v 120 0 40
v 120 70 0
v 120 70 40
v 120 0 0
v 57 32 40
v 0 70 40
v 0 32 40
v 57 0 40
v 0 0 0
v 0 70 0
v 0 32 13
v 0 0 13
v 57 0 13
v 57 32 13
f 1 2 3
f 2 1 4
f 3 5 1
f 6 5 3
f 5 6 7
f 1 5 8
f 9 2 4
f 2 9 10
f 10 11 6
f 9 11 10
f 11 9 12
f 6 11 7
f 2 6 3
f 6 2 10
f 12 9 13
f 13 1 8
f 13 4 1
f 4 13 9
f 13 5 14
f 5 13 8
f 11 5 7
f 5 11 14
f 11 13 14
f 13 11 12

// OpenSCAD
// Dimensions in millimetres
outer_x = 120;
outer_y = 70;
outer_z = 40;

wall_thickness = 3;
floor_thickness = 3;

platform_length = 60;
platform_width = outer_y;  // spans full Y
platform_height_above_floor = 10;  // top at z = 13 (floor at z = 3, so 10 mm above)

hole_diameter = 2;
hole_radius = hole_diameter / 2;
hole_z = 30;  // z-level of hole center
hole_y = 0;   // along Y=0 (end wall)

// The tank must rest on the XY plane at z = 0, so the floor must be at z = 0
// The entire model must be shifted so that the lowest point is at z = 0
// Currently, the model is extending from z = -2.00 to z = 40.00, so we need to shift up by 2.00 mm

// We'll build everything with z = 0 at the floor, and ensure:
// - The floor is at z = 0
// - The platform top is at z = 13
// - The hole centers are at z = 30

// Build the tank body: outer dimensions 120 x 70 x 40, with 3 mm walls and 3 mm floor
// The inner cavity is from z = 3 to z = 40 (since floor is 3 mm thick), and x,y offset by wall_thickness

module tank() {
    difference() {
        // Outer box: from z = 0 to z = 40
        cube([outer_x, outer_y, outer_z], center = false);
        // Inner cavity: from z = 3 to z = 40, and x,y offset by wall_thickness
        translate([wall_thickness, wall_thickness, 3]) {
            cube([outer_x - 2*wall_thickness, outer_y - 2*wall_thickness, outer_z - 3], center = false);
        }
    }
}

// Platform: solid, 60 mm long in X, full Y, 10 mm high, top at z = 13, so bottom at z = 3
module platform() {
    // Platform is 10 mm high, from z = 3 to z = 13
    // Centered in X: from x = (120 - 60)/2 = 30 to 90
    // So center at x = 60
    translate([60, 0, 3]) {
        cube([platform_length, platform_width, 10], center = false);
    }
}

// End holes: horizontal, along X-axis, at y = 0, z = 30
// Each hole is a cylinder of diameter 2 mm, aligned along X-axis
// The hole must pass through the end wall at X = ±(outer_x/2 - wall_thickness) = ±(60 - 3) = ±57
// We'll place the cylinder at x = 57 and x = -57, but since the model is from x = 0 to 120, we use x = 57 and x = 63? Wait.

// The tank is from x = 0 to 120, y = 0 to 70, z = 0 to 40
// The left end wall is at x = 0, right end wall at x = 120
// The wall thickness is 3 mm, so the hole is drilled through the wall at x = 0 (left) and x = 120 (right)
// But the hole is horizontal, so it goes from x = 0 to x = 3 (left wall) and from x = 117 to x = 120 (right wall)

// We need to drill a hole through the left end wall (x = 0) and the right end wall (x = 120)
// The hole is centered at (x, y, z) = (0, 0, 30) for left, (120, 0, 30) for right
// But the hole is horizontal, so we use a cylinder along X-axis

module hole_at_end(x_pos) {
    // Place a cylinder at the end wall (x = x_pos), at y = 0, z = 30
    // Rotate to align cylinder along X-axis (so it's horizontal)
    translate([x_pos, 0, 30]) {
        rotate([90, 0, 0]) {
            cylinder(r = hole_radius, h = wall_thickness + 1, $fn = 64, center = true);
        }
    }
}

// Main assembly: build the tank, add the platform, then subtract the two end holes
// We do this in a single difference to ensure the holes are properly cut

$fn = 64;

// We need to ensure the entire model is at z >= 0 and centered in X and Y
// The tank is from x = 0 to 120, y = 0 to 70, so it's not centered at origin
// But the specification says "centre it on the origin in X and Y"
// So we need to shift the entire model so that the center of X is 0, and center of Y is 0

// Current tank: x = 0 to 120 → center at x = 60
// y = 0 to 70 → center at y = 35
// So we need to translate by (-60, -35, 0)

// But the floor is at z = 0, so we don't shift in z

// Let's build the model centered at origin

// We'll build the entire model with x from -60 to 60, y from -35 to 35, z from 0 to 40
// So we need to shift the tank and platform accordingly

// Recompute: we'll build everything relative to center

// New centering:
// - X: from -60 to 60 (size 120)
// - Y: from -35 to 35 (size 70)
// - Z: from 0 to 40 (size 40)

// Tank body: from x = -60 to 60, y = -35 to 35, z = 0 to 40
// Inner cavity: from x = -60 + 3 to 60 - 3 = -57 to 57, y = -35 + 3 to 35 - 3 = -32 to 32, z = 3 to 40

module tank() {
    difference() {
        // Outer box: from x = -60 to 60, y = -35 to 35, z = 0 to 40
        cube([outer_x, outer_y, outer_z], center = false);
        // Inner cavity: from x = -57 to 57, y = -32 to 32, z = 3 to 40
        translate([-57, -32, 3]) {
            cube([114, 64, 37], center = false);
        }
    }
}

// Platform: 60 mm long in X, so from x = -30 to 30 (centered at 0), y = -35 to 35, z = 3 to 13
module platform() {
    translate([0, 0, 3]) {
        cube([platform_length, platform_width, 10], center = false);
    }
}

// End holes: horizontal, at y = 0, z = 30
// Left hole: through wall at x = -60 (left end), so hole at x = -60, y = 0, z = 30
// Right hole: through wall at x = 60 (right end), so hole at x = 60, y = 0, z = 30
// Each hole is a cylinder along X-axis

module hole_at_end(x_pos) {
    // Place cylinder at (x_pos, 0, 30), rotate to align along X-axis
    translate([x_pos, 0, 30]) {
        rotate([90, 0, 0]) {
            cylinder(r = hole_radius, h = wall_thickness + 1, $fn = 64, center = true);
        }
    }
}

// Main assembly: build the tank, add the platform, subtract the two holes
// All centered at origin in X and Y, floor at z = 0

union() {
    tank();
    platform();
}

// Subtract the two end holes (through the end walls)
difference() {
    // Start with the unioned body (tank + platform)
    union() {
        tank();
        platform();
    }

    // Subtract left hole (at x = -60)
    hole_at_end(-60);

    // Subtract right hole (at x = 60)
    hole_at_end(60);
}
